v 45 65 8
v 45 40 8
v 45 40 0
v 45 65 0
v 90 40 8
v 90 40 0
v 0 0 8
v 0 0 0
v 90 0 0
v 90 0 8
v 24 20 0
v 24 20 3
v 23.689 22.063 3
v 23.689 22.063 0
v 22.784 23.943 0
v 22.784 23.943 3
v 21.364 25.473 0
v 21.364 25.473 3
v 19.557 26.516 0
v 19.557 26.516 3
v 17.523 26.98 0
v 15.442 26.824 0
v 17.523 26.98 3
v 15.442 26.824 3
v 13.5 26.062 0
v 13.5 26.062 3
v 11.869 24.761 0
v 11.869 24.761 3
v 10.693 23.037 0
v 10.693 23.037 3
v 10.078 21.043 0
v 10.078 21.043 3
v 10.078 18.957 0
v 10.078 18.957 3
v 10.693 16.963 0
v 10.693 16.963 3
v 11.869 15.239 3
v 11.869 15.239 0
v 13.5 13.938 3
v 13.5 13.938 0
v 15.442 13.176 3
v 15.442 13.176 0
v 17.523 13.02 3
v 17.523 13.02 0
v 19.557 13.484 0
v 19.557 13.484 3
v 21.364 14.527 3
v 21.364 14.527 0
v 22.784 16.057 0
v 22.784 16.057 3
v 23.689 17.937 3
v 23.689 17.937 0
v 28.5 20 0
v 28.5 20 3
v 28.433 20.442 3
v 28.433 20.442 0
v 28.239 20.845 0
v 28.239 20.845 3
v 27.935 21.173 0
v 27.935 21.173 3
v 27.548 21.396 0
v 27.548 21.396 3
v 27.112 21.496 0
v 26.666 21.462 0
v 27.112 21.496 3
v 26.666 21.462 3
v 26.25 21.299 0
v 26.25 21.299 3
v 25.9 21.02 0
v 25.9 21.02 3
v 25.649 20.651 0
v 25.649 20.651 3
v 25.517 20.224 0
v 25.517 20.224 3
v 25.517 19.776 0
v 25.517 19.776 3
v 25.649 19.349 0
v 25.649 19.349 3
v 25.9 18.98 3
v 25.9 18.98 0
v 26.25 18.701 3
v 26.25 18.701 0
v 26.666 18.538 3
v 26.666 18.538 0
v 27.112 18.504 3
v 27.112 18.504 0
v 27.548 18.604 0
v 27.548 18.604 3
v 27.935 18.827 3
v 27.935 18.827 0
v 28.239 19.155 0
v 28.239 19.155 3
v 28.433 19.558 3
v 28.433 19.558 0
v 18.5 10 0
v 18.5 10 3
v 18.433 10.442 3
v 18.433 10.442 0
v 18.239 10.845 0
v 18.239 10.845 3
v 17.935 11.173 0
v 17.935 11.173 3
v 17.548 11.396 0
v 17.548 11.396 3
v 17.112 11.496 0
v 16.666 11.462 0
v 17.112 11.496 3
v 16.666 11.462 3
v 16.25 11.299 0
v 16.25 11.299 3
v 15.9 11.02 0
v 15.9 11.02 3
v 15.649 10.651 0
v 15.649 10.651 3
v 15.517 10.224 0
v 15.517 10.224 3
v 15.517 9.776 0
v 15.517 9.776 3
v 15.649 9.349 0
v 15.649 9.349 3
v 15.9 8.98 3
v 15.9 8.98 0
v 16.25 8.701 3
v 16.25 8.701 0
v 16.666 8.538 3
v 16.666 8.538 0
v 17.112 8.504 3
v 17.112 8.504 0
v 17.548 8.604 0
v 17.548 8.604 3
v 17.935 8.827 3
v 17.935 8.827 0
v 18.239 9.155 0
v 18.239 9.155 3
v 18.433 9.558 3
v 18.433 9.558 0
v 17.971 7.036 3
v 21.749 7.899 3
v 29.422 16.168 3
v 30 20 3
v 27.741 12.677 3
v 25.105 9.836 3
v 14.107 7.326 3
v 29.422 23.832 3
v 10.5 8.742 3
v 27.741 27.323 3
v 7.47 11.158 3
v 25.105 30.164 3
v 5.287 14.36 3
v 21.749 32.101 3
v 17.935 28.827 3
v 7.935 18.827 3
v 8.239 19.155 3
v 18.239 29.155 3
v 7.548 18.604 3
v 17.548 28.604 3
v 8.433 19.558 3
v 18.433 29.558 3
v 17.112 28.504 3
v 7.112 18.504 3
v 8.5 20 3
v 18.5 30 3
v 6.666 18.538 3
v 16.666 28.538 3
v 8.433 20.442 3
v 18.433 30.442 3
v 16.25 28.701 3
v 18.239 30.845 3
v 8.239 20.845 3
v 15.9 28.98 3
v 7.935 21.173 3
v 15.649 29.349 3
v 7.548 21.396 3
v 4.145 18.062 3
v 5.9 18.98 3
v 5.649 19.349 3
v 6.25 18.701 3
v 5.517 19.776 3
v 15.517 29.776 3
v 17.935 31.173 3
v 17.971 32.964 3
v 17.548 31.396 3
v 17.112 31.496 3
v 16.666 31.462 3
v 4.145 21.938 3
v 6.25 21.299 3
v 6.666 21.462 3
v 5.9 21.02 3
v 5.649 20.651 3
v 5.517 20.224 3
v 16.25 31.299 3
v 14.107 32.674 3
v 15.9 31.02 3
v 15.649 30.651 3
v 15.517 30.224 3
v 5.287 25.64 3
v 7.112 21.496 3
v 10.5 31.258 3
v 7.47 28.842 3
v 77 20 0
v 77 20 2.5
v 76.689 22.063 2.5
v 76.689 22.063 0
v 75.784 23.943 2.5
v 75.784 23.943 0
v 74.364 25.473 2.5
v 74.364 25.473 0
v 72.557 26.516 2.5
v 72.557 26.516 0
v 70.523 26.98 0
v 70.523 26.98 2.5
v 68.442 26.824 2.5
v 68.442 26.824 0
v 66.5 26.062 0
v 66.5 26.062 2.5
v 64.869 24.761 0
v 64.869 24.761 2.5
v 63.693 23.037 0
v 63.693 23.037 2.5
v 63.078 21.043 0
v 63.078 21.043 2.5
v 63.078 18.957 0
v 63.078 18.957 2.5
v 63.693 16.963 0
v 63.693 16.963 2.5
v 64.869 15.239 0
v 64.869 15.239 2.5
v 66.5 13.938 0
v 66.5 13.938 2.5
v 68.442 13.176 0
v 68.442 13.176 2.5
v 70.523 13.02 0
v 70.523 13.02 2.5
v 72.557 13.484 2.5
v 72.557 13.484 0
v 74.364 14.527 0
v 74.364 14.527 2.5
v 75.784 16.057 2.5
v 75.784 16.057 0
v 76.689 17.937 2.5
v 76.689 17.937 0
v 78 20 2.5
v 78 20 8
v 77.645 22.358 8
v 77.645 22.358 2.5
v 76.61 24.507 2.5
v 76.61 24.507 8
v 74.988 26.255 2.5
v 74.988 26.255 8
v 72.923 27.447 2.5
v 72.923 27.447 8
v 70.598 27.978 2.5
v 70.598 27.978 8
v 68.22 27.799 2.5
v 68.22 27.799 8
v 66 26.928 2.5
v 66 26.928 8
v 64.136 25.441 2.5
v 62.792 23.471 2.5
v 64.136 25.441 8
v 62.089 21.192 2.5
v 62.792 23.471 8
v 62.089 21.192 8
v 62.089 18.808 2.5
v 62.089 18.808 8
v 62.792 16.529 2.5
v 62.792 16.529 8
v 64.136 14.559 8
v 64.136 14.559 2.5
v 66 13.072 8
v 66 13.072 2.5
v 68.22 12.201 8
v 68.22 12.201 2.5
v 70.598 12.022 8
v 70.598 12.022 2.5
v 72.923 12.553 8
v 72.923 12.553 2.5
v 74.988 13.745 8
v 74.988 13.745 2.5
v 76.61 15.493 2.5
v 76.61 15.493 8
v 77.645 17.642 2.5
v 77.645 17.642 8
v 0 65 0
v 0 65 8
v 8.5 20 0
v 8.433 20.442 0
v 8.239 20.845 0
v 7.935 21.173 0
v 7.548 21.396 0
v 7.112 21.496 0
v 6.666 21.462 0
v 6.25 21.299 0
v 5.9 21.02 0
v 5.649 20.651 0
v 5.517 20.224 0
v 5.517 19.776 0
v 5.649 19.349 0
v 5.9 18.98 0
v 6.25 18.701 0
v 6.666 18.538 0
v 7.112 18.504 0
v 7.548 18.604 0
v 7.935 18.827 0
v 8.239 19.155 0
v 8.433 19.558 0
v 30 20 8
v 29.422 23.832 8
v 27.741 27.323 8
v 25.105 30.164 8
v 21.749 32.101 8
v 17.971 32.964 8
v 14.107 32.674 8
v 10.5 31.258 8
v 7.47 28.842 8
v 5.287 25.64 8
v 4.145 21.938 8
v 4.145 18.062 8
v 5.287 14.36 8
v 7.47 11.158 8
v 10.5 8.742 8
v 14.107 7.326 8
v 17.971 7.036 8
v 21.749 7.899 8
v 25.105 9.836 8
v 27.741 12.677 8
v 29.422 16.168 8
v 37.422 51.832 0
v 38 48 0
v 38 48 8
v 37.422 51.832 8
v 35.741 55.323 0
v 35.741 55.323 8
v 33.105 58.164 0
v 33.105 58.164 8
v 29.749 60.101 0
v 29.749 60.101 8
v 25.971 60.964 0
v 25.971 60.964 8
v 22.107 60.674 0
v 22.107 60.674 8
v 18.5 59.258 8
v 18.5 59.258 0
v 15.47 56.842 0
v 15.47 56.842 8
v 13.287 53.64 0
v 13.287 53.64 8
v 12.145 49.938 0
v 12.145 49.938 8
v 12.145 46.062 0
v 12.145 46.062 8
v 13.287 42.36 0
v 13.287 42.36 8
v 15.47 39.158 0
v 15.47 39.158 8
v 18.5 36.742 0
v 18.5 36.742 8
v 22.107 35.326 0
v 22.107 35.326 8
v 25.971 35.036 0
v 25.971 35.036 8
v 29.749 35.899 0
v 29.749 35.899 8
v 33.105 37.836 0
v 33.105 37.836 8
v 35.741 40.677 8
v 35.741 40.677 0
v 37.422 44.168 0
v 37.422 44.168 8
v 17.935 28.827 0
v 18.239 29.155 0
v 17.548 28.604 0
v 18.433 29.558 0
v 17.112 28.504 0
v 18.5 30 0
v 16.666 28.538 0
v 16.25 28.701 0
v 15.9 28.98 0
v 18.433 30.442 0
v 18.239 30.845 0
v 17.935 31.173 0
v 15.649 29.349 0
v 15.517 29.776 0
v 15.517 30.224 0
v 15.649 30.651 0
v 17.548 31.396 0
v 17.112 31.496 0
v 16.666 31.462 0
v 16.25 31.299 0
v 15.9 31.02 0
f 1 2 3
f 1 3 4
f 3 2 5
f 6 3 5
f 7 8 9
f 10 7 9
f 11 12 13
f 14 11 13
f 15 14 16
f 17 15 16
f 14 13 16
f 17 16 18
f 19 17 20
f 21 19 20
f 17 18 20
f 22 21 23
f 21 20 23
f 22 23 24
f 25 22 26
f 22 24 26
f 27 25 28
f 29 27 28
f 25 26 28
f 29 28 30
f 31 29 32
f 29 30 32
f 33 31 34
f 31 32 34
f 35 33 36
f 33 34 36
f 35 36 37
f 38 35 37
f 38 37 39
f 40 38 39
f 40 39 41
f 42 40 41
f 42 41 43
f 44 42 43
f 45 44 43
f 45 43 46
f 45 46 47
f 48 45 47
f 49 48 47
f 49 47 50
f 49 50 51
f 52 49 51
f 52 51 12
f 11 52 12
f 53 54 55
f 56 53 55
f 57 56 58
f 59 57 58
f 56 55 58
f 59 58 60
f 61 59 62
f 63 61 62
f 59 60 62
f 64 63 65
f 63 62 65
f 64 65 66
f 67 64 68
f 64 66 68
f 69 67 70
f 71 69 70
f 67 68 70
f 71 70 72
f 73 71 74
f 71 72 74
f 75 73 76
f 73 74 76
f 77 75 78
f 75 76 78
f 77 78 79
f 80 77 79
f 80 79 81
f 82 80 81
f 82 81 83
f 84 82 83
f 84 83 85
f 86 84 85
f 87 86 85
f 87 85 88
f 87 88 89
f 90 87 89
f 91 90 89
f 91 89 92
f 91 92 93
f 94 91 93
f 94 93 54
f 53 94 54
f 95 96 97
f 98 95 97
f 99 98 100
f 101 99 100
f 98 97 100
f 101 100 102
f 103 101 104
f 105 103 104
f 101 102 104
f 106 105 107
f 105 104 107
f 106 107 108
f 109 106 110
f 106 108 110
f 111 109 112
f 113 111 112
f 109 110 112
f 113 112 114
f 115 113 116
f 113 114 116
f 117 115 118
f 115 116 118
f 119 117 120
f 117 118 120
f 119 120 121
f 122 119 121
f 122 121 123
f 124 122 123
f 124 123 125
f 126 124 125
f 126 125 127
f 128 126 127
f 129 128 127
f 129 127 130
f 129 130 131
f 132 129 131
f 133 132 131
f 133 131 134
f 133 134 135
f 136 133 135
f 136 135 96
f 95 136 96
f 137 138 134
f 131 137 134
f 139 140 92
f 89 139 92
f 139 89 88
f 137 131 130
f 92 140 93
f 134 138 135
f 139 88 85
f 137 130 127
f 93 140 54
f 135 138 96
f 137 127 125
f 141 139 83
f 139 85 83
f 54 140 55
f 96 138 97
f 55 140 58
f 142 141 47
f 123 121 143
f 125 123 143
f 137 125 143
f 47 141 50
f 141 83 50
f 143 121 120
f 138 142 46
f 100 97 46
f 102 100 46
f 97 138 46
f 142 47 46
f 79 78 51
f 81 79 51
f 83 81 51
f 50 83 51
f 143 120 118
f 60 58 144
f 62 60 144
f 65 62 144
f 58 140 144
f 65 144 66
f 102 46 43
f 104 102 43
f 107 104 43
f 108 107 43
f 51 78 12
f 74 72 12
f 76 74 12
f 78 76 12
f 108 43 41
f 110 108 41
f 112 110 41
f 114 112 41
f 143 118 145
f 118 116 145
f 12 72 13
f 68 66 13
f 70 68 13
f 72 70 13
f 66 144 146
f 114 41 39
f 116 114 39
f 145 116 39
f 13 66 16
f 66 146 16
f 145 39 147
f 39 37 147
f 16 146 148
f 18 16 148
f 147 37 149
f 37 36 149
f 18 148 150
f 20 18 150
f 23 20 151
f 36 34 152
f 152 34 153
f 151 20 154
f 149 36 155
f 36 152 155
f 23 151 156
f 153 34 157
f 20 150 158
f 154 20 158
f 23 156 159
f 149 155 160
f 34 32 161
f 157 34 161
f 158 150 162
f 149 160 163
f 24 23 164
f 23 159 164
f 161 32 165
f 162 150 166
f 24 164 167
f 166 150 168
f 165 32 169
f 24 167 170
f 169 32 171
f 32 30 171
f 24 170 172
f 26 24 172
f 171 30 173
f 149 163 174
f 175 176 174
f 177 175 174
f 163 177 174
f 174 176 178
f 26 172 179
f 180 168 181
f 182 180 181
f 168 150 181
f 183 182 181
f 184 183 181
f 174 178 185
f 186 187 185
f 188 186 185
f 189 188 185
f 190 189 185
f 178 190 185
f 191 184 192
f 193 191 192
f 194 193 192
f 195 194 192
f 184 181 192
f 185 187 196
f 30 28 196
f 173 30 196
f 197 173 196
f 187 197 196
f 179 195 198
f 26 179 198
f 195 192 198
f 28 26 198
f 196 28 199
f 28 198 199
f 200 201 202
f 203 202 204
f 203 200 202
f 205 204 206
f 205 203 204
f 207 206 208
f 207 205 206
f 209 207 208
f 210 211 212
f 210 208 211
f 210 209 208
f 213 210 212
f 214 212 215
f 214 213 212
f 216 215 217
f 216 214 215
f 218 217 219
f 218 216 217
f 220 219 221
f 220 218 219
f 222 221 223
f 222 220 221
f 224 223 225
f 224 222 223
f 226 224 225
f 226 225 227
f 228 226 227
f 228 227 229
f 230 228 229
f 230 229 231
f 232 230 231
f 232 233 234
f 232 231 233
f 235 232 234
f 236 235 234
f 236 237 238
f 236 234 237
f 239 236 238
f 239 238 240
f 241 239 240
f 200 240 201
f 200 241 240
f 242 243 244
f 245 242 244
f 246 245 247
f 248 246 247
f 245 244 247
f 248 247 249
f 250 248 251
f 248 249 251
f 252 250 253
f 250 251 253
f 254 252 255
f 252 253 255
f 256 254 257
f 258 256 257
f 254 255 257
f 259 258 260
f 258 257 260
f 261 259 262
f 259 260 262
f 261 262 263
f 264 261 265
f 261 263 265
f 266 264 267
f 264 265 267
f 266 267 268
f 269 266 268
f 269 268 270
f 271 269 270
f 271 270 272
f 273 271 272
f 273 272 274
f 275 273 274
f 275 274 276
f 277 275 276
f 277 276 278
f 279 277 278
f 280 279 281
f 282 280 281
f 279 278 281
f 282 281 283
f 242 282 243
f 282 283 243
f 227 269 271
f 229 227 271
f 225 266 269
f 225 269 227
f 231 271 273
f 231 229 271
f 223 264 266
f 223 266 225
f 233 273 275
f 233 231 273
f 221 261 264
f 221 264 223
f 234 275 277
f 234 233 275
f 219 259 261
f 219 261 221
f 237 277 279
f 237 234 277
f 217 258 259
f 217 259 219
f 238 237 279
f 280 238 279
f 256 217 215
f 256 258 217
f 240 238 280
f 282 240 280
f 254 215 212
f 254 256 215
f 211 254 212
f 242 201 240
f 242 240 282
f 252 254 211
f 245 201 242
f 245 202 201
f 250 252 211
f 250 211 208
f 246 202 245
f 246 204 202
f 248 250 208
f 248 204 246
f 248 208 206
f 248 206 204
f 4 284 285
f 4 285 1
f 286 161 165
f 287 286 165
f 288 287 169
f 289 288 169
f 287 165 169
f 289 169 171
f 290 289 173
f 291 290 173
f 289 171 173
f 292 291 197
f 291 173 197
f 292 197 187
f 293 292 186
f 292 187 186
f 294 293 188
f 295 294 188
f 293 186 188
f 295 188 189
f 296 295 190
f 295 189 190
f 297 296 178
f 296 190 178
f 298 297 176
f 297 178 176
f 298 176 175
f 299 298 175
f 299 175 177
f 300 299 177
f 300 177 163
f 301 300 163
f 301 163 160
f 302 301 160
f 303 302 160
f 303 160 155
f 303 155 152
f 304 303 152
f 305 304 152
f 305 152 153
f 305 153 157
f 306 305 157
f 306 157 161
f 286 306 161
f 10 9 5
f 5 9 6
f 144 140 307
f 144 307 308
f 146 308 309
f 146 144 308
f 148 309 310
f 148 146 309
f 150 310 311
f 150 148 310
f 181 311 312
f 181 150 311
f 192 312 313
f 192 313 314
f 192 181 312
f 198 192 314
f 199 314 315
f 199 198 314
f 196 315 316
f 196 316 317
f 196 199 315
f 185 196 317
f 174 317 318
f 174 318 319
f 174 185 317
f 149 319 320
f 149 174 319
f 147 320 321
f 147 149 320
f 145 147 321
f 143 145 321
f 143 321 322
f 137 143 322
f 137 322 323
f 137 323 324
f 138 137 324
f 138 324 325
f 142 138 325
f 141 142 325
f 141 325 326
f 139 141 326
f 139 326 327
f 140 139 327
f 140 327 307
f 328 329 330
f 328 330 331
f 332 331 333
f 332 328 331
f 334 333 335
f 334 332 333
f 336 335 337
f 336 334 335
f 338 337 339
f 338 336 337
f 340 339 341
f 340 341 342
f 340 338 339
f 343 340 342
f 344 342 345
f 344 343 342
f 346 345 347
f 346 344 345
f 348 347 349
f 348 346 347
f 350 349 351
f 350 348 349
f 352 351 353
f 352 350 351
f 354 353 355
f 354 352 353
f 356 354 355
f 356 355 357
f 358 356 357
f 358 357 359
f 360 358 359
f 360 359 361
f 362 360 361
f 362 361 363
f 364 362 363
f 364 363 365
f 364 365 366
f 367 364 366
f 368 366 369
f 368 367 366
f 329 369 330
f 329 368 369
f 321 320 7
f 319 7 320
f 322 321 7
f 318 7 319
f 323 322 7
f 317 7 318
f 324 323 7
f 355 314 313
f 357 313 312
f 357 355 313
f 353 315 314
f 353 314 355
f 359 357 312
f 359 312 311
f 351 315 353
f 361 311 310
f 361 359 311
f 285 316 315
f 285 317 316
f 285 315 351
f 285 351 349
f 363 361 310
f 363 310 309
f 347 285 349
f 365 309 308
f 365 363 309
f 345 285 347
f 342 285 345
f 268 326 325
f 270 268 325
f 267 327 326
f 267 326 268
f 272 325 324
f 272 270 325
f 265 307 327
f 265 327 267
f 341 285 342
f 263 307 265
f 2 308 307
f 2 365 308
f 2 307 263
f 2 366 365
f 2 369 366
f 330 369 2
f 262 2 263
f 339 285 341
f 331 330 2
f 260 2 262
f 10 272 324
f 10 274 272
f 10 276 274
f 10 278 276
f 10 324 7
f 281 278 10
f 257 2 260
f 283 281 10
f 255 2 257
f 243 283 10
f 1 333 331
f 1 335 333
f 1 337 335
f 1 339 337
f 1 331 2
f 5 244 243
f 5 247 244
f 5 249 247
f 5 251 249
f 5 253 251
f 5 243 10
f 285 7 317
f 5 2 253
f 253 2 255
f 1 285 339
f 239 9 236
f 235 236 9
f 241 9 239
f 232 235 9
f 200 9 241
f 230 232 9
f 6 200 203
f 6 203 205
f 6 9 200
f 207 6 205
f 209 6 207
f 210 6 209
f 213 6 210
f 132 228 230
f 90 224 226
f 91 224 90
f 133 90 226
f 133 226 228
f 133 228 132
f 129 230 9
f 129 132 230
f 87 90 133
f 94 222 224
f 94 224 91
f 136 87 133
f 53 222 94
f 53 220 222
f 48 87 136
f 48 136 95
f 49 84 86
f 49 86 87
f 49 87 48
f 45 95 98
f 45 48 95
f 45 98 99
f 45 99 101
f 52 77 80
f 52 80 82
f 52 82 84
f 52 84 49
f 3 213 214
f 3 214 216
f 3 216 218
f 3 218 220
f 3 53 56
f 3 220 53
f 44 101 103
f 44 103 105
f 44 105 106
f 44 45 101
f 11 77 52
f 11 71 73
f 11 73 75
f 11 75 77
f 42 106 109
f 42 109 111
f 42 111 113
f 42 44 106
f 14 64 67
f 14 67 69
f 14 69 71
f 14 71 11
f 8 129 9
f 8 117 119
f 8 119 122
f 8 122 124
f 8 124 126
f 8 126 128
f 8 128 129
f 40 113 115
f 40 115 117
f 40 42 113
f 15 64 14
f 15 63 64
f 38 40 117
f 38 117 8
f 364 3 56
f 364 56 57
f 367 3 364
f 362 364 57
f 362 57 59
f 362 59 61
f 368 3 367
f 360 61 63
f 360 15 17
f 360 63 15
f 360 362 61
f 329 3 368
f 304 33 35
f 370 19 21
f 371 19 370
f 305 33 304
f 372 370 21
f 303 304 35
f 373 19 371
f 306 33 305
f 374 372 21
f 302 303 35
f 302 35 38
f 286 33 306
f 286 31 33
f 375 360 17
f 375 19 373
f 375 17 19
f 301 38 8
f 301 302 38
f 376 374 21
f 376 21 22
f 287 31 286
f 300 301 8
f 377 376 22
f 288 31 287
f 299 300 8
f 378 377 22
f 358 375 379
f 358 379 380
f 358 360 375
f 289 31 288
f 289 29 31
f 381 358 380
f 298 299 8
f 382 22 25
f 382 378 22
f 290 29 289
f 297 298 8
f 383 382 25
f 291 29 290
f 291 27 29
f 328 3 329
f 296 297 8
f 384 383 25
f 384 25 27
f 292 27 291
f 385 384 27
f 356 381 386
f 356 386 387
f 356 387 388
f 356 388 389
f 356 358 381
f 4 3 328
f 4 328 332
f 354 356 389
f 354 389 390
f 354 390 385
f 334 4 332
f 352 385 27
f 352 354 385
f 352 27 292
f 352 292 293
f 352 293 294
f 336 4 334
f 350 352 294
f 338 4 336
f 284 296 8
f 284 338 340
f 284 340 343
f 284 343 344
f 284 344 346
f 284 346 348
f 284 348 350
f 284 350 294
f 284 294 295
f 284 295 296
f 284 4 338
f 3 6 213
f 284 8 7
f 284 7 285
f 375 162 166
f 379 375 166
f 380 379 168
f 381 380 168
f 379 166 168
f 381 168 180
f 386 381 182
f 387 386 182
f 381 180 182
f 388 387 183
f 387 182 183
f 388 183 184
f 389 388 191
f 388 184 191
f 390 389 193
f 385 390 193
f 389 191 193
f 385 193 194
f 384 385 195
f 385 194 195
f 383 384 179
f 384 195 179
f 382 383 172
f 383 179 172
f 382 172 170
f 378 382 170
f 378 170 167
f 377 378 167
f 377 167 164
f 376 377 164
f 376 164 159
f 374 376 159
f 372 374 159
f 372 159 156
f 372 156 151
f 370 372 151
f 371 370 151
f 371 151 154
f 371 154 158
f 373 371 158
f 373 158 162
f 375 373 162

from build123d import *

# Parameters (mm, degrees)
ESQUISSE1_W             = 90
ESQUISSE1_H             = 65
ESQUISSE1_R             = 7
ESQUISSE1_R_2           = 13
BOSS_EXTRU_1_DEPTH      = 8
ESQUISSE2_R             = 13
BOSS_EXTRU_2_DEPTH      = 3
ESQUISSE3_R             = 7
ESQUISSE3_R_2           = 1.5
ENL_V_MAT_EXTRU_1_DEPTH = 112.130553854
ESQUISSE4_R             = 8
ENL_V_MAT_EXTRU_2_DEPTH = 5.5
ESQUISSE5_W             = 45
ESQUISSE5_H             = 25
ENL_V_MAT_EXTRU_3_DEPTH = 112.30588484


with BuildPart() as part:
    # Esquisse1 → Boss.-Extru.1 (new body)
    with BuildSketch(Plane.XY):
        with Locations((45, 32.5)):
            Rectangle(ESQUISSE1_W, ESQUISSE1_H)
        with Locations((70, 20)):
            Circle(ESQUISSE1_R, mode=Mode.SUBTRACT)
        with Locations((17, 20)):
            Circle(ESQUISSE1_R_2, mode=Mode.SUBTRACT)
        with Locations((25, 48)):
            Circle(ESQUISSE1_R_2, mode=Mode.SUBTRACT)
    extrude(amount=BOSS_EXTRU_1_DEPTH)

    # Esquisse2 → Boss.-Extru.2 (add)
    with BuildSketch(Plane(origin=(0, 0, 0), x_dir=(-1, 0, 0), z_dir=(0, 0, -1))):
        with Locations((-17, 20)):
            Circle(ESQUISSE2_R)
    extrude(amount=-BOSS_EXTRU_2_DEPTH)

    # Esquisse3 → Enlèv. mat.-Extru.1 (cut, through all)
    with BuildSketch(Plane.XY.offset(3)):
        with Locations((17, 20)):
            Circle(ESQUISSE3_R)
        with Locations((27, 20)):
            Circle(ESQUISSE3_R_2)
        with Locations((17, 10)):
            Circle(ESQUISSE3_R_2)
        with Locations((7, 20)):
            Circle(ESQUISSE3_R_2)
        with Locations((17, 30)):
            Circle(ESQUISSE3_R_2)
    extrude(amount=-ENL_V_MAT_EXTRU_1_DEPTH, mode=Mode.SUBTRACT)

    # Esquisse4 → Enlèv. mat.-Extru.2 (cut)
    with BuildSketch(Plane.XY.offset(8)):
        with Locations((70, 20)):
            Circle(ESQUISSE4_R)
    extrude(amount=-ENL_V_MAT_EXTRU_2_DEPTH, mode=Mode.SUBTRACT)

    # Esquisse5 → Enlèv. mat.-Extru.3 (cut, through all)
    with BuildSketch(Plane.XY.offset(8)):
        with Locations((67.5, 52.5)):
            Rectangle(ESQUISSE5_W, ESQUISSE5_H)
    extrude(amount=-ENL_V_MAT_EXTRU_3_DEPTH, mode=Mode.SUBTRACT)


solid = part.part
